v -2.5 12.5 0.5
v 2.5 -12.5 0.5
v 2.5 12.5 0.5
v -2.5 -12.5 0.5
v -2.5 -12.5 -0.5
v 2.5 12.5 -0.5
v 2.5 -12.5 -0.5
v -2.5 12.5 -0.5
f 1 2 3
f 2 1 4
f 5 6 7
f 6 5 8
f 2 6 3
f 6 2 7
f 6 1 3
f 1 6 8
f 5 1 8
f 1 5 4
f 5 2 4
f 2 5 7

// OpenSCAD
bar();

module bar(length)
{
    rotate([0,0,90]) cube([25,5,length],center = true);
}
